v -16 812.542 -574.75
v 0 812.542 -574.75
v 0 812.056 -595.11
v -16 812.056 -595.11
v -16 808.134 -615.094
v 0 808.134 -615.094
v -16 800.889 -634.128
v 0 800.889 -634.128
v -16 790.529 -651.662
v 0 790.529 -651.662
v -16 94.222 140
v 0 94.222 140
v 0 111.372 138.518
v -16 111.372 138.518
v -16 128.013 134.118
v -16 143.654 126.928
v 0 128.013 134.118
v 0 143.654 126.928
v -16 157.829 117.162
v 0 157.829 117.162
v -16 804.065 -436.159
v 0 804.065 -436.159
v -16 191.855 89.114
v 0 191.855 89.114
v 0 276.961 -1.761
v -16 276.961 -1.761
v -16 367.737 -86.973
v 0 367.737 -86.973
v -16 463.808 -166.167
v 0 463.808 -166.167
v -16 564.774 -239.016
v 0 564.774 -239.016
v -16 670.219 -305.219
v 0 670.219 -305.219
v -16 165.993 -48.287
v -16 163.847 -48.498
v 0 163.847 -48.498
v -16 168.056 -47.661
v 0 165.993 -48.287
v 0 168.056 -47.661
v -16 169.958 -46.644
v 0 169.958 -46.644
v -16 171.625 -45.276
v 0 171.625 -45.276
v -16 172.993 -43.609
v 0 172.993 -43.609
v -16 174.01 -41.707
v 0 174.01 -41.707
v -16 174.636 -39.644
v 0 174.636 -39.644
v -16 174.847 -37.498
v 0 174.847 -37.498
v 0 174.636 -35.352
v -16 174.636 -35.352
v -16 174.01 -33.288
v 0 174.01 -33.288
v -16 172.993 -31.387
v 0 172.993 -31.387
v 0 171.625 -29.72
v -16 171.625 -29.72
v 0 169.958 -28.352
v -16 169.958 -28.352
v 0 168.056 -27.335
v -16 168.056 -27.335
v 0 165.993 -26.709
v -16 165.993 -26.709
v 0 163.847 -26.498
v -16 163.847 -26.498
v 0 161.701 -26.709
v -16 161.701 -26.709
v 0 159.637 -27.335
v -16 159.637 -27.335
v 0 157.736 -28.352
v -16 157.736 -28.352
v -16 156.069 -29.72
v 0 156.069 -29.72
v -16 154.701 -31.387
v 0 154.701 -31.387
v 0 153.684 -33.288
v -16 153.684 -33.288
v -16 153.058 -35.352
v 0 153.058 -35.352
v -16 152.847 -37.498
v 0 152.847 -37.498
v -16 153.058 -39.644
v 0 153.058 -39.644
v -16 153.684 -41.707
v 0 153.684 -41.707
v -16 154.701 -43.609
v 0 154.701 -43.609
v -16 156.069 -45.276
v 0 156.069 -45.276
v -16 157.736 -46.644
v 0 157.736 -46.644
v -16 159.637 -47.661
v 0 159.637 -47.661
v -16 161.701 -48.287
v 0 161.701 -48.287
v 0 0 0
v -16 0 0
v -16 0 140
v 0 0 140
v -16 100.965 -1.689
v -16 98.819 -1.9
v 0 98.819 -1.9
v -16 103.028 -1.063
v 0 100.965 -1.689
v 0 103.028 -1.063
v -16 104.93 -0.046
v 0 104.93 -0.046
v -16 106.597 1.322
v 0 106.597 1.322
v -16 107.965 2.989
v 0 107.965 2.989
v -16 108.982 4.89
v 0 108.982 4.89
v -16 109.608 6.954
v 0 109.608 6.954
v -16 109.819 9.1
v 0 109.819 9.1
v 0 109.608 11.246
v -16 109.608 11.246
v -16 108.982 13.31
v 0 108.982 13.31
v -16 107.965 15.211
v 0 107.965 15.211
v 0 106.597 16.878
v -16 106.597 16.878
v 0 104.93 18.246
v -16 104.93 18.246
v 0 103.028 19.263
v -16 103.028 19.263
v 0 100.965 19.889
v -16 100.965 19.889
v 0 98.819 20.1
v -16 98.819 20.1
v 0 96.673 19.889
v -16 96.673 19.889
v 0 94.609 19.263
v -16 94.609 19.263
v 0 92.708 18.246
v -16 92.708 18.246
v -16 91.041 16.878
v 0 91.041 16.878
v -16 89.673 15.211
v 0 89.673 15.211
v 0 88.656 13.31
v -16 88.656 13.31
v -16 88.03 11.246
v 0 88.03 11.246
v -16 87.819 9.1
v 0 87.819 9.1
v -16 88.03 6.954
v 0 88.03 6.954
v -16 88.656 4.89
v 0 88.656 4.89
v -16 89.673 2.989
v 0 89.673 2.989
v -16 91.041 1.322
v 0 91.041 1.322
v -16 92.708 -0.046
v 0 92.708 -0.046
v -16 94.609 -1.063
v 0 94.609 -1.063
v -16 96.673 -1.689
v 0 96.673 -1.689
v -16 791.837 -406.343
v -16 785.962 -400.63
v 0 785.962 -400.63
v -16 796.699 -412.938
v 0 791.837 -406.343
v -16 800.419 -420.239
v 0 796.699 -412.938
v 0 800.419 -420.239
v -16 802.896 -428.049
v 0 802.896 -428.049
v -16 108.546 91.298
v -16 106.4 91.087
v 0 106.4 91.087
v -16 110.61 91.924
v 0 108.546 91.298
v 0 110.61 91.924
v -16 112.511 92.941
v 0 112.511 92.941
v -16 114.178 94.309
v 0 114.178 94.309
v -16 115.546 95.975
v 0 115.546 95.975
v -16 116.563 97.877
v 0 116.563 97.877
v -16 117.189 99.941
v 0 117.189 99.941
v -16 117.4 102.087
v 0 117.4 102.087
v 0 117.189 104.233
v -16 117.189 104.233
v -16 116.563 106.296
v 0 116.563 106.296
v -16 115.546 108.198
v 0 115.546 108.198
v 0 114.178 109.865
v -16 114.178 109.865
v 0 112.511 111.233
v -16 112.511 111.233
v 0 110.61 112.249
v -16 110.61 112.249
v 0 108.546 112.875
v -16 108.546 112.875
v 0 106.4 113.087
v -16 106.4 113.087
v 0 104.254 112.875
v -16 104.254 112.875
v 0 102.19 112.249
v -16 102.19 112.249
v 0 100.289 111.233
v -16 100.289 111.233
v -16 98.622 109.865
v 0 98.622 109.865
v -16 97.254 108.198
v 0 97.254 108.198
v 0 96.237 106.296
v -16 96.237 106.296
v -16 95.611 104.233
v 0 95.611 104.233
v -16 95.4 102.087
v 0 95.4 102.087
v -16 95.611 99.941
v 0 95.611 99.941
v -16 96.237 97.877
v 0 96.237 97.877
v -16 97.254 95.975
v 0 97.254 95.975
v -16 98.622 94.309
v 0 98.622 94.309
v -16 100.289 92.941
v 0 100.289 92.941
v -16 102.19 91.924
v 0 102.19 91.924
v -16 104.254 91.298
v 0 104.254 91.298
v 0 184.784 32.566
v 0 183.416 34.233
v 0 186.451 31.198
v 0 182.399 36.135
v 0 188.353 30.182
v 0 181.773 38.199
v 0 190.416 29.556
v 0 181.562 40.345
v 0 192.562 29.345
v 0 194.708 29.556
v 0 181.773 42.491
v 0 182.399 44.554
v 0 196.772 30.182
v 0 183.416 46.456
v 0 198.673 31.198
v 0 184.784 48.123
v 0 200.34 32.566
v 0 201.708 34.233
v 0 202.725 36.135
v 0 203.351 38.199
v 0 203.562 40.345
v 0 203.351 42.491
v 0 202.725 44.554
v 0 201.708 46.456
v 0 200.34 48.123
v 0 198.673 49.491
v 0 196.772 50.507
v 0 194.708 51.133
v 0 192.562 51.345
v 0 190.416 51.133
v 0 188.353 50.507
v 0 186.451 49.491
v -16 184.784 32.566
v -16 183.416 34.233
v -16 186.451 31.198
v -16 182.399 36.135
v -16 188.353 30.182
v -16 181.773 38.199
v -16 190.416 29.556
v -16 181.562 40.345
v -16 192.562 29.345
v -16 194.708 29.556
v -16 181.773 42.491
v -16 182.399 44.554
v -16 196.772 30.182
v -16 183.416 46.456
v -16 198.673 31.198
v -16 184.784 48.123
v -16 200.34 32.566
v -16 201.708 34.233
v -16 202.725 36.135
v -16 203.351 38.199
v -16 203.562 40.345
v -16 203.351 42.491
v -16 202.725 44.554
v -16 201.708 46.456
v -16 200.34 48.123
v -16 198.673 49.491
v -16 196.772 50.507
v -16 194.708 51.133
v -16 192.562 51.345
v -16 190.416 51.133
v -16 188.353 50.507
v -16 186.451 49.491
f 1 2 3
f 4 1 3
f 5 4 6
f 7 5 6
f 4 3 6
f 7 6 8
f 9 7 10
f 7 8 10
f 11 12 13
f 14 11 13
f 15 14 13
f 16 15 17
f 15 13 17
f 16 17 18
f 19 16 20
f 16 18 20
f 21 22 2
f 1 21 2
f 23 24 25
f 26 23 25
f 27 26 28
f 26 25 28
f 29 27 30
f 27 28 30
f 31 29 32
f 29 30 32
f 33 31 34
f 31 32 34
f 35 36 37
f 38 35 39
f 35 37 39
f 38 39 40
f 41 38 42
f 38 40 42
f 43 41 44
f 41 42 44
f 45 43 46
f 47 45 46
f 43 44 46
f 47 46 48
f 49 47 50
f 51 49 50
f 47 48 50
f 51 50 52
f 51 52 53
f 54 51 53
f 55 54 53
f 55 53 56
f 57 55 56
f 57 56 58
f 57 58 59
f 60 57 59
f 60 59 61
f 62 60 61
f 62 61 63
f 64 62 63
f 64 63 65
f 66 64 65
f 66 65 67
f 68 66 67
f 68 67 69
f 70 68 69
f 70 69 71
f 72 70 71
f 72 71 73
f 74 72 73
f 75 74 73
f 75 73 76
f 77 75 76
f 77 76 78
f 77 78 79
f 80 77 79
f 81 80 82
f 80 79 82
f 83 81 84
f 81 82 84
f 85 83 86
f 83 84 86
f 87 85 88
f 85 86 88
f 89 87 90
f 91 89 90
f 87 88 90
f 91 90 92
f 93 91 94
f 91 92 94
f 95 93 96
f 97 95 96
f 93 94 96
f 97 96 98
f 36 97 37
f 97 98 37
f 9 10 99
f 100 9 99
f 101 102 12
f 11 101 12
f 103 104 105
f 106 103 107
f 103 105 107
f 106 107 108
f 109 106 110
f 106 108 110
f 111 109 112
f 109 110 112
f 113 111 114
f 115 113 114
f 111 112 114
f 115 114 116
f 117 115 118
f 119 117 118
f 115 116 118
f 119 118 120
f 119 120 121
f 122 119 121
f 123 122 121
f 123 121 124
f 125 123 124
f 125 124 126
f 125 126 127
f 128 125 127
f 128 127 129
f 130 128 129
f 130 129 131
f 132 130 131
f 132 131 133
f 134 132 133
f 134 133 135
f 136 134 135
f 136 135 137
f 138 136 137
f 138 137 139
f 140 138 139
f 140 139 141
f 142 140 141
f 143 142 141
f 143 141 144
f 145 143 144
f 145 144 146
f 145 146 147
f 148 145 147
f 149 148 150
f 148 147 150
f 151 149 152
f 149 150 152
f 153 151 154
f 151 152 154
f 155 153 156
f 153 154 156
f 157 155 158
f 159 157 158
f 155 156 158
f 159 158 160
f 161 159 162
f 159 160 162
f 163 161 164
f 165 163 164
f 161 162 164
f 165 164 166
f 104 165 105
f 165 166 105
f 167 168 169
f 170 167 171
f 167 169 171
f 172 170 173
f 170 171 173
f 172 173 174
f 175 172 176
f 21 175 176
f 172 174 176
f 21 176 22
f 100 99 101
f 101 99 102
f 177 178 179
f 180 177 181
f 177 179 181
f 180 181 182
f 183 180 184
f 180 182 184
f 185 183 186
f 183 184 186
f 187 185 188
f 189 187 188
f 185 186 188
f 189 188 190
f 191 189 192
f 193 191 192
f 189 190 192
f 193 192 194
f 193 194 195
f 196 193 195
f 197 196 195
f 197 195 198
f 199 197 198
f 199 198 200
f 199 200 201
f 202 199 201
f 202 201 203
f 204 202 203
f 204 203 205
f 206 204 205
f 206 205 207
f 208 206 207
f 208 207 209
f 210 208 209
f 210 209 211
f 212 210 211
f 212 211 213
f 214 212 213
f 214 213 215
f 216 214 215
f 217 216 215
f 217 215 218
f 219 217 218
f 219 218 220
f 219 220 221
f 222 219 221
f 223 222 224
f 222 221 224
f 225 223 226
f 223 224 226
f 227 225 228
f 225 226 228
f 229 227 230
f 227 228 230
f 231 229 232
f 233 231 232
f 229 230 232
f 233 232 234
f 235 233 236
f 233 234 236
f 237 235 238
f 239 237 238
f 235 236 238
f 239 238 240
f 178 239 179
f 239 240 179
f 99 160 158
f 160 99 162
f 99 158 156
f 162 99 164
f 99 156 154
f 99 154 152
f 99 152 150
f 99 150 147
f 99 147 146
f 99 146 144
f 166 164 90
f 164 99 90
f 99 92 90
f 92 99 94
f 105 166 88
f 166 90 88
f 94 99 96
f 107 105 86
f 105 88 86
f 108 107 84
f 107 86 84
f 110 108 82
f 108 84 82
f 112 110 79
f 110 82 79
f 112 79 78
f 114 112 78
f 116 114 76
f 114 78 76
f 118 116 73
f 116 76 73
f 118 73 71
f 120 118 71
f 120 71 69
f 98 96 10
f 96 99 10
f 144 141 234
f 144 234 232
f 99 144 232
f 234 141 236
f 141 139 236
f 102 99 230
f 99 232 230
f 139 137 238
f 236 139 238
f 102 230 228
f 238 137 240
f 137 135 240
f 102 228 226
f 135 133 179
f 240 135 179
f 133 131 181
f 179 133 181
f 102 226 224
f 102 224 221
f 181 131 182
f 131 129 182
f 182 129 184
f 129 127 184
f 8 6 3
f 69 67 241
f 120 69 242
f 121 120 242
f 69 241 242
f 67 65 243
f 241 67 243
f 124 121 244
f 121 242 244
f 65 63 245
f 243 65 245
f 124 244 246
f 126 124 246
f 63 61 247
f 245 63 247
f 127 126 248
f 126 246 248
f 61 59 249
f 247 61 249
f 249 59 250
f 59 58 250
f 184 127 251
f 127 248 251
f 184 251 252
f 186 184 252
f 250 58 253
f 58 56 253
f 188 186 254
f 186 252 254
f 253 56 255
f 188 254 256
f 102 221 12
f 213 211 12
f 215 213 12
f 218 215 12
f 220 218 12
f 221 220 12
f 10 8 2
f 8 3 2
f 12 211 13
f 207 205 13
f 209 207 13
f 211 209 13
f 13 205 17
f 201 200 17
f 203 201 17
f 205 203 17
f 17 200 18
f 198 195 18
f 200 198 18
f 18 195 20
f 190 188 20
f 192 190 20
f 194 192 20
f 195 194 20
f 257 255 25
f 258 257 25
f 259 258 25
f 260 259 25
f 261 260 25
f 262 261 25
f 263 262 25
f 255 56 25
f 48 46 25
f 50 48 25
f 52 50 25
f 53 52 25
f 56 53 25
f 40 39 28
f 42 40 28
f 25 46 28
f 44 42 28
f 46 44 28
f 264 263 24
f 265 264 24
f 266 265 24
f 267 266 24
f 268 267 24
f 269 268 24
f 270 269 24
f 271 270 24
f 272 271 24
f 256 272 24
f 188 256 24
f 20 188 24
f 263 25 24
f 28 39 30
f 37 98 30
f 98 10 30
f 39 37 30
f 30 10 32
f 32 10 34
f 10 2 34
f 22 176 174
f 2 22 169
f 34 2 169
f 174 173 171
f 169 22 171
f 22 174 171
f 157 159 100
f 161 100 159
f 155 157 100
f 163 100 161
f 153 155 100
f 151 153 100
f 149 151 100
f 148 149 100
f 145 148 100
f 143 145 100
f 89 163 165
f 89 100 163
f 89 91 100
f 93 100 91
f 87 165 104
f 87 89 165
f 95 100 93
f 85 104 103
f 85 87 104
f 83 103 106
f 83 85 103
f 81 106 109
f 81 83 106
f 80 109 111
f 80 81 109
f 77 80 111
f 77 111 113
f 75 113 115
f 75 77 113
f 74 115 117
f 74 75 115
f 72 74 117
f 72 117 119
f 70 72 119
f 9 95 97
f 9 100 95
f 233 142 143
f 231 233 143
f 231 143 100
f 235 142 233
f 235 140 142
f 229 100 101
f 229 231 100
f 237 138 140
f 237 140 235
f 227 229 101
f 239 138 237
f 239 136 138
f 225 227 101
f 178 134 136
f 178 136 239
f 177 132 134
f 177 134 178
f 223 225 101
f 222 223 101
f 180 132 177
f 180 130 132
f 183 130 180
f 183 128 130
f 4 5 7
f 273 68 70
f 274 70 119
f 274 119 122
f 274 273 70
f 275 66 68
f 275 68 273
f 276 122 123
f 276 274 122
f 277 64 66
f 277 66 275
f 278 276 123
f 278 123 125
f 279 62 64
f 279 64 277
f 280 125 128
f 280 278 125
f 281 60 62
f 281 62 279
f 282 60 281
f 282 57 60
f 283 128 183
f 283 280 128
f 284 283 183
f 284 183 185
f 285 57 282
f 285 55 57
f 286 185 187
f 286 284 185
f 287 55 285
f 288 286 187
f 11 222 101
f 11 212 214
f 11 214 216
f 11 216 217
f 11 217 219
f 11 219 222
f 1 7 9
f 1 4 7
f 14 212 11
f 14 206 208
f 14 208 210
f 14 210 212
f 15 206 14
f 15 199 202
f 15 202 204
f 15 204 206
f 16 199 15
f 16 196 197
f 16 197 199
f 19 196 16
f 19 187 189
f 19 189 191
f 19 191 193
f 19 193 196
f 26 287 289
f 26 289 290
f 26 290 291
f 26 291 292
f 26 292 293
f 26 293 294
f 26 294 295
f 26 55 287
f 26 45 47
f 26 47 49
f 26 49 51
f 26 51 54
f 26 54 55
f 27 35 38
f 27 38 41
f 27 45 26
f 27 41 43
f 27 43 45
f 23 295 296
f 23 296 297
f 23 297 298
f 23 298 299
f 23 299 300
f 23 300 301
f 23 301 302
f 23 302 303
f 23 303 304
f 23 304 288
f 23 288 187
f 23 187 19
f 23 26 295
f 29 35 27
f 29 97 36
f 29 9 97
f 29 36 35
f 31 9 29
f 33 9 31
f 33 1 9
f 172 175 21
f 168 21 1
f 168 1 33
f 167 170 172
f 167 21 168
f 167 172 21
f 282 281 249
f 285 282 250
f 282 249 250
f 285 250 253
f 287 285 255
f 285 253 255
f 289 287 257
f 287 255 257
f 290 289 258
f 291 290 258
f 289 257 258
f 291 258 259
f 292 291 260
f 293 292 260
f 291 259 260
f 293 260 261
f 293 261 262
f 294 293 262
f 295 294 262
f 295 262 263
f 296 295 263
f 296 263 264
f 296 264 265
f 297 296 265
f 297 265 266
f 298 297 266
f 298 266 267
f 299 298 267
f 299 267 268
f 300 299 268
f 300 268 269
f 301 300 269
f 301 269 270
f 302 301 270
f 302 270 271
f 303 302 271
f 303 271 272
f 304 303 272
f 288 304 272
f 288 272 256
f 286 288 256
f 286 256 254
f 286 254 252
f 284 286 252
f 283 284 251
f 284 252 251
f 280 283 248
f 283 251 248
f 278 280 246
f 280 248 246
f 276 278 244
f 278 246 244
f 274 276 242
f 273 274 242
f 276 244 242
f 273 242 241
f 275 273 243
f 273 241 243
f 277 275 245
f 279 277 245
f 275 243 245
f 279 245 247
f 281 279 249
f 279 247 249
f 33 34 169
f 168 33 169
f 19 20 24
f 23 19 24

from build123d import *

# Parameters (mm, degrees)
BASE_FLANGE1_DEPTH = 16
SKETCH3_R          = 11
CUT_HOLES_DEPTH    = 1042.876868884


# Sheet-metal steps are written as plain solids
with BuildPart() as part:
    # Sketch1 → Base-Flange1 (new body)
    with BuildSketch(Plane(origin=(0, 0, 0), x_dir=(0, 0, -1), z_dir=(1, 0, 0))):
        with BuildLine():
            Line((305.218612063, 670.218640107), (400.630345104, 785.962327615))
            ThreePointArc((400.630345104, 785.962327615), (416.512049286, 798.70874281), (436.159147295, 804.065156521))
            Line((436.159147295, 804.065156521), (574.750134607, 812.541744435))
            ThreePointArc((574.750134607, 812.541744435), (615.094497482, 808.133571726), (651.662136675, 790.529385681))
            Line((651.662136675, 790.529385681), (0, 0))
            Line((0, 0), (-140, 0))
            Line((-140, 0), (-140, 94.22160699))
            ThreePointArc((-140, 94.22160699), (-134.117601526, 128.01327879), (-117.162458339, 157.829429018))
            Line((-117.162458339, 157.829429018), (-89.113742378, 191.855242319))
            ThreePointArc((-89.113742378, 191.855242319), (127.343049427, 415.134985706), (305.218612063, 670.218640107))
        make_face()
    extrude(amount=-BASE_FLANGE1_DEPTH)

    # Sketch3 → Cut-Holes (cut, through all)
    with BuildSketch(Plane(origin=(0, 0, 0), x_dir=(0, 0, -1), z_dir=(1, 0, 0))):
        with Locations((-40.344519187, 192.562071849)):
            Circle(SKETCH3_R)
        with Locations((-102.086703913, 106.4)):
            Circle(SKETCH3_R)
        with Locations((-9.1, 98.818911988)):
            Circle(SKETCH3_R)
        with Locations((37.497875264, 163.846890742)):
            Circle(SKETCH3_R)
    extrude(amount=-CUT_HOLES_DEPTH, mode=Mode.SUBTRACT)


solid = part.part
